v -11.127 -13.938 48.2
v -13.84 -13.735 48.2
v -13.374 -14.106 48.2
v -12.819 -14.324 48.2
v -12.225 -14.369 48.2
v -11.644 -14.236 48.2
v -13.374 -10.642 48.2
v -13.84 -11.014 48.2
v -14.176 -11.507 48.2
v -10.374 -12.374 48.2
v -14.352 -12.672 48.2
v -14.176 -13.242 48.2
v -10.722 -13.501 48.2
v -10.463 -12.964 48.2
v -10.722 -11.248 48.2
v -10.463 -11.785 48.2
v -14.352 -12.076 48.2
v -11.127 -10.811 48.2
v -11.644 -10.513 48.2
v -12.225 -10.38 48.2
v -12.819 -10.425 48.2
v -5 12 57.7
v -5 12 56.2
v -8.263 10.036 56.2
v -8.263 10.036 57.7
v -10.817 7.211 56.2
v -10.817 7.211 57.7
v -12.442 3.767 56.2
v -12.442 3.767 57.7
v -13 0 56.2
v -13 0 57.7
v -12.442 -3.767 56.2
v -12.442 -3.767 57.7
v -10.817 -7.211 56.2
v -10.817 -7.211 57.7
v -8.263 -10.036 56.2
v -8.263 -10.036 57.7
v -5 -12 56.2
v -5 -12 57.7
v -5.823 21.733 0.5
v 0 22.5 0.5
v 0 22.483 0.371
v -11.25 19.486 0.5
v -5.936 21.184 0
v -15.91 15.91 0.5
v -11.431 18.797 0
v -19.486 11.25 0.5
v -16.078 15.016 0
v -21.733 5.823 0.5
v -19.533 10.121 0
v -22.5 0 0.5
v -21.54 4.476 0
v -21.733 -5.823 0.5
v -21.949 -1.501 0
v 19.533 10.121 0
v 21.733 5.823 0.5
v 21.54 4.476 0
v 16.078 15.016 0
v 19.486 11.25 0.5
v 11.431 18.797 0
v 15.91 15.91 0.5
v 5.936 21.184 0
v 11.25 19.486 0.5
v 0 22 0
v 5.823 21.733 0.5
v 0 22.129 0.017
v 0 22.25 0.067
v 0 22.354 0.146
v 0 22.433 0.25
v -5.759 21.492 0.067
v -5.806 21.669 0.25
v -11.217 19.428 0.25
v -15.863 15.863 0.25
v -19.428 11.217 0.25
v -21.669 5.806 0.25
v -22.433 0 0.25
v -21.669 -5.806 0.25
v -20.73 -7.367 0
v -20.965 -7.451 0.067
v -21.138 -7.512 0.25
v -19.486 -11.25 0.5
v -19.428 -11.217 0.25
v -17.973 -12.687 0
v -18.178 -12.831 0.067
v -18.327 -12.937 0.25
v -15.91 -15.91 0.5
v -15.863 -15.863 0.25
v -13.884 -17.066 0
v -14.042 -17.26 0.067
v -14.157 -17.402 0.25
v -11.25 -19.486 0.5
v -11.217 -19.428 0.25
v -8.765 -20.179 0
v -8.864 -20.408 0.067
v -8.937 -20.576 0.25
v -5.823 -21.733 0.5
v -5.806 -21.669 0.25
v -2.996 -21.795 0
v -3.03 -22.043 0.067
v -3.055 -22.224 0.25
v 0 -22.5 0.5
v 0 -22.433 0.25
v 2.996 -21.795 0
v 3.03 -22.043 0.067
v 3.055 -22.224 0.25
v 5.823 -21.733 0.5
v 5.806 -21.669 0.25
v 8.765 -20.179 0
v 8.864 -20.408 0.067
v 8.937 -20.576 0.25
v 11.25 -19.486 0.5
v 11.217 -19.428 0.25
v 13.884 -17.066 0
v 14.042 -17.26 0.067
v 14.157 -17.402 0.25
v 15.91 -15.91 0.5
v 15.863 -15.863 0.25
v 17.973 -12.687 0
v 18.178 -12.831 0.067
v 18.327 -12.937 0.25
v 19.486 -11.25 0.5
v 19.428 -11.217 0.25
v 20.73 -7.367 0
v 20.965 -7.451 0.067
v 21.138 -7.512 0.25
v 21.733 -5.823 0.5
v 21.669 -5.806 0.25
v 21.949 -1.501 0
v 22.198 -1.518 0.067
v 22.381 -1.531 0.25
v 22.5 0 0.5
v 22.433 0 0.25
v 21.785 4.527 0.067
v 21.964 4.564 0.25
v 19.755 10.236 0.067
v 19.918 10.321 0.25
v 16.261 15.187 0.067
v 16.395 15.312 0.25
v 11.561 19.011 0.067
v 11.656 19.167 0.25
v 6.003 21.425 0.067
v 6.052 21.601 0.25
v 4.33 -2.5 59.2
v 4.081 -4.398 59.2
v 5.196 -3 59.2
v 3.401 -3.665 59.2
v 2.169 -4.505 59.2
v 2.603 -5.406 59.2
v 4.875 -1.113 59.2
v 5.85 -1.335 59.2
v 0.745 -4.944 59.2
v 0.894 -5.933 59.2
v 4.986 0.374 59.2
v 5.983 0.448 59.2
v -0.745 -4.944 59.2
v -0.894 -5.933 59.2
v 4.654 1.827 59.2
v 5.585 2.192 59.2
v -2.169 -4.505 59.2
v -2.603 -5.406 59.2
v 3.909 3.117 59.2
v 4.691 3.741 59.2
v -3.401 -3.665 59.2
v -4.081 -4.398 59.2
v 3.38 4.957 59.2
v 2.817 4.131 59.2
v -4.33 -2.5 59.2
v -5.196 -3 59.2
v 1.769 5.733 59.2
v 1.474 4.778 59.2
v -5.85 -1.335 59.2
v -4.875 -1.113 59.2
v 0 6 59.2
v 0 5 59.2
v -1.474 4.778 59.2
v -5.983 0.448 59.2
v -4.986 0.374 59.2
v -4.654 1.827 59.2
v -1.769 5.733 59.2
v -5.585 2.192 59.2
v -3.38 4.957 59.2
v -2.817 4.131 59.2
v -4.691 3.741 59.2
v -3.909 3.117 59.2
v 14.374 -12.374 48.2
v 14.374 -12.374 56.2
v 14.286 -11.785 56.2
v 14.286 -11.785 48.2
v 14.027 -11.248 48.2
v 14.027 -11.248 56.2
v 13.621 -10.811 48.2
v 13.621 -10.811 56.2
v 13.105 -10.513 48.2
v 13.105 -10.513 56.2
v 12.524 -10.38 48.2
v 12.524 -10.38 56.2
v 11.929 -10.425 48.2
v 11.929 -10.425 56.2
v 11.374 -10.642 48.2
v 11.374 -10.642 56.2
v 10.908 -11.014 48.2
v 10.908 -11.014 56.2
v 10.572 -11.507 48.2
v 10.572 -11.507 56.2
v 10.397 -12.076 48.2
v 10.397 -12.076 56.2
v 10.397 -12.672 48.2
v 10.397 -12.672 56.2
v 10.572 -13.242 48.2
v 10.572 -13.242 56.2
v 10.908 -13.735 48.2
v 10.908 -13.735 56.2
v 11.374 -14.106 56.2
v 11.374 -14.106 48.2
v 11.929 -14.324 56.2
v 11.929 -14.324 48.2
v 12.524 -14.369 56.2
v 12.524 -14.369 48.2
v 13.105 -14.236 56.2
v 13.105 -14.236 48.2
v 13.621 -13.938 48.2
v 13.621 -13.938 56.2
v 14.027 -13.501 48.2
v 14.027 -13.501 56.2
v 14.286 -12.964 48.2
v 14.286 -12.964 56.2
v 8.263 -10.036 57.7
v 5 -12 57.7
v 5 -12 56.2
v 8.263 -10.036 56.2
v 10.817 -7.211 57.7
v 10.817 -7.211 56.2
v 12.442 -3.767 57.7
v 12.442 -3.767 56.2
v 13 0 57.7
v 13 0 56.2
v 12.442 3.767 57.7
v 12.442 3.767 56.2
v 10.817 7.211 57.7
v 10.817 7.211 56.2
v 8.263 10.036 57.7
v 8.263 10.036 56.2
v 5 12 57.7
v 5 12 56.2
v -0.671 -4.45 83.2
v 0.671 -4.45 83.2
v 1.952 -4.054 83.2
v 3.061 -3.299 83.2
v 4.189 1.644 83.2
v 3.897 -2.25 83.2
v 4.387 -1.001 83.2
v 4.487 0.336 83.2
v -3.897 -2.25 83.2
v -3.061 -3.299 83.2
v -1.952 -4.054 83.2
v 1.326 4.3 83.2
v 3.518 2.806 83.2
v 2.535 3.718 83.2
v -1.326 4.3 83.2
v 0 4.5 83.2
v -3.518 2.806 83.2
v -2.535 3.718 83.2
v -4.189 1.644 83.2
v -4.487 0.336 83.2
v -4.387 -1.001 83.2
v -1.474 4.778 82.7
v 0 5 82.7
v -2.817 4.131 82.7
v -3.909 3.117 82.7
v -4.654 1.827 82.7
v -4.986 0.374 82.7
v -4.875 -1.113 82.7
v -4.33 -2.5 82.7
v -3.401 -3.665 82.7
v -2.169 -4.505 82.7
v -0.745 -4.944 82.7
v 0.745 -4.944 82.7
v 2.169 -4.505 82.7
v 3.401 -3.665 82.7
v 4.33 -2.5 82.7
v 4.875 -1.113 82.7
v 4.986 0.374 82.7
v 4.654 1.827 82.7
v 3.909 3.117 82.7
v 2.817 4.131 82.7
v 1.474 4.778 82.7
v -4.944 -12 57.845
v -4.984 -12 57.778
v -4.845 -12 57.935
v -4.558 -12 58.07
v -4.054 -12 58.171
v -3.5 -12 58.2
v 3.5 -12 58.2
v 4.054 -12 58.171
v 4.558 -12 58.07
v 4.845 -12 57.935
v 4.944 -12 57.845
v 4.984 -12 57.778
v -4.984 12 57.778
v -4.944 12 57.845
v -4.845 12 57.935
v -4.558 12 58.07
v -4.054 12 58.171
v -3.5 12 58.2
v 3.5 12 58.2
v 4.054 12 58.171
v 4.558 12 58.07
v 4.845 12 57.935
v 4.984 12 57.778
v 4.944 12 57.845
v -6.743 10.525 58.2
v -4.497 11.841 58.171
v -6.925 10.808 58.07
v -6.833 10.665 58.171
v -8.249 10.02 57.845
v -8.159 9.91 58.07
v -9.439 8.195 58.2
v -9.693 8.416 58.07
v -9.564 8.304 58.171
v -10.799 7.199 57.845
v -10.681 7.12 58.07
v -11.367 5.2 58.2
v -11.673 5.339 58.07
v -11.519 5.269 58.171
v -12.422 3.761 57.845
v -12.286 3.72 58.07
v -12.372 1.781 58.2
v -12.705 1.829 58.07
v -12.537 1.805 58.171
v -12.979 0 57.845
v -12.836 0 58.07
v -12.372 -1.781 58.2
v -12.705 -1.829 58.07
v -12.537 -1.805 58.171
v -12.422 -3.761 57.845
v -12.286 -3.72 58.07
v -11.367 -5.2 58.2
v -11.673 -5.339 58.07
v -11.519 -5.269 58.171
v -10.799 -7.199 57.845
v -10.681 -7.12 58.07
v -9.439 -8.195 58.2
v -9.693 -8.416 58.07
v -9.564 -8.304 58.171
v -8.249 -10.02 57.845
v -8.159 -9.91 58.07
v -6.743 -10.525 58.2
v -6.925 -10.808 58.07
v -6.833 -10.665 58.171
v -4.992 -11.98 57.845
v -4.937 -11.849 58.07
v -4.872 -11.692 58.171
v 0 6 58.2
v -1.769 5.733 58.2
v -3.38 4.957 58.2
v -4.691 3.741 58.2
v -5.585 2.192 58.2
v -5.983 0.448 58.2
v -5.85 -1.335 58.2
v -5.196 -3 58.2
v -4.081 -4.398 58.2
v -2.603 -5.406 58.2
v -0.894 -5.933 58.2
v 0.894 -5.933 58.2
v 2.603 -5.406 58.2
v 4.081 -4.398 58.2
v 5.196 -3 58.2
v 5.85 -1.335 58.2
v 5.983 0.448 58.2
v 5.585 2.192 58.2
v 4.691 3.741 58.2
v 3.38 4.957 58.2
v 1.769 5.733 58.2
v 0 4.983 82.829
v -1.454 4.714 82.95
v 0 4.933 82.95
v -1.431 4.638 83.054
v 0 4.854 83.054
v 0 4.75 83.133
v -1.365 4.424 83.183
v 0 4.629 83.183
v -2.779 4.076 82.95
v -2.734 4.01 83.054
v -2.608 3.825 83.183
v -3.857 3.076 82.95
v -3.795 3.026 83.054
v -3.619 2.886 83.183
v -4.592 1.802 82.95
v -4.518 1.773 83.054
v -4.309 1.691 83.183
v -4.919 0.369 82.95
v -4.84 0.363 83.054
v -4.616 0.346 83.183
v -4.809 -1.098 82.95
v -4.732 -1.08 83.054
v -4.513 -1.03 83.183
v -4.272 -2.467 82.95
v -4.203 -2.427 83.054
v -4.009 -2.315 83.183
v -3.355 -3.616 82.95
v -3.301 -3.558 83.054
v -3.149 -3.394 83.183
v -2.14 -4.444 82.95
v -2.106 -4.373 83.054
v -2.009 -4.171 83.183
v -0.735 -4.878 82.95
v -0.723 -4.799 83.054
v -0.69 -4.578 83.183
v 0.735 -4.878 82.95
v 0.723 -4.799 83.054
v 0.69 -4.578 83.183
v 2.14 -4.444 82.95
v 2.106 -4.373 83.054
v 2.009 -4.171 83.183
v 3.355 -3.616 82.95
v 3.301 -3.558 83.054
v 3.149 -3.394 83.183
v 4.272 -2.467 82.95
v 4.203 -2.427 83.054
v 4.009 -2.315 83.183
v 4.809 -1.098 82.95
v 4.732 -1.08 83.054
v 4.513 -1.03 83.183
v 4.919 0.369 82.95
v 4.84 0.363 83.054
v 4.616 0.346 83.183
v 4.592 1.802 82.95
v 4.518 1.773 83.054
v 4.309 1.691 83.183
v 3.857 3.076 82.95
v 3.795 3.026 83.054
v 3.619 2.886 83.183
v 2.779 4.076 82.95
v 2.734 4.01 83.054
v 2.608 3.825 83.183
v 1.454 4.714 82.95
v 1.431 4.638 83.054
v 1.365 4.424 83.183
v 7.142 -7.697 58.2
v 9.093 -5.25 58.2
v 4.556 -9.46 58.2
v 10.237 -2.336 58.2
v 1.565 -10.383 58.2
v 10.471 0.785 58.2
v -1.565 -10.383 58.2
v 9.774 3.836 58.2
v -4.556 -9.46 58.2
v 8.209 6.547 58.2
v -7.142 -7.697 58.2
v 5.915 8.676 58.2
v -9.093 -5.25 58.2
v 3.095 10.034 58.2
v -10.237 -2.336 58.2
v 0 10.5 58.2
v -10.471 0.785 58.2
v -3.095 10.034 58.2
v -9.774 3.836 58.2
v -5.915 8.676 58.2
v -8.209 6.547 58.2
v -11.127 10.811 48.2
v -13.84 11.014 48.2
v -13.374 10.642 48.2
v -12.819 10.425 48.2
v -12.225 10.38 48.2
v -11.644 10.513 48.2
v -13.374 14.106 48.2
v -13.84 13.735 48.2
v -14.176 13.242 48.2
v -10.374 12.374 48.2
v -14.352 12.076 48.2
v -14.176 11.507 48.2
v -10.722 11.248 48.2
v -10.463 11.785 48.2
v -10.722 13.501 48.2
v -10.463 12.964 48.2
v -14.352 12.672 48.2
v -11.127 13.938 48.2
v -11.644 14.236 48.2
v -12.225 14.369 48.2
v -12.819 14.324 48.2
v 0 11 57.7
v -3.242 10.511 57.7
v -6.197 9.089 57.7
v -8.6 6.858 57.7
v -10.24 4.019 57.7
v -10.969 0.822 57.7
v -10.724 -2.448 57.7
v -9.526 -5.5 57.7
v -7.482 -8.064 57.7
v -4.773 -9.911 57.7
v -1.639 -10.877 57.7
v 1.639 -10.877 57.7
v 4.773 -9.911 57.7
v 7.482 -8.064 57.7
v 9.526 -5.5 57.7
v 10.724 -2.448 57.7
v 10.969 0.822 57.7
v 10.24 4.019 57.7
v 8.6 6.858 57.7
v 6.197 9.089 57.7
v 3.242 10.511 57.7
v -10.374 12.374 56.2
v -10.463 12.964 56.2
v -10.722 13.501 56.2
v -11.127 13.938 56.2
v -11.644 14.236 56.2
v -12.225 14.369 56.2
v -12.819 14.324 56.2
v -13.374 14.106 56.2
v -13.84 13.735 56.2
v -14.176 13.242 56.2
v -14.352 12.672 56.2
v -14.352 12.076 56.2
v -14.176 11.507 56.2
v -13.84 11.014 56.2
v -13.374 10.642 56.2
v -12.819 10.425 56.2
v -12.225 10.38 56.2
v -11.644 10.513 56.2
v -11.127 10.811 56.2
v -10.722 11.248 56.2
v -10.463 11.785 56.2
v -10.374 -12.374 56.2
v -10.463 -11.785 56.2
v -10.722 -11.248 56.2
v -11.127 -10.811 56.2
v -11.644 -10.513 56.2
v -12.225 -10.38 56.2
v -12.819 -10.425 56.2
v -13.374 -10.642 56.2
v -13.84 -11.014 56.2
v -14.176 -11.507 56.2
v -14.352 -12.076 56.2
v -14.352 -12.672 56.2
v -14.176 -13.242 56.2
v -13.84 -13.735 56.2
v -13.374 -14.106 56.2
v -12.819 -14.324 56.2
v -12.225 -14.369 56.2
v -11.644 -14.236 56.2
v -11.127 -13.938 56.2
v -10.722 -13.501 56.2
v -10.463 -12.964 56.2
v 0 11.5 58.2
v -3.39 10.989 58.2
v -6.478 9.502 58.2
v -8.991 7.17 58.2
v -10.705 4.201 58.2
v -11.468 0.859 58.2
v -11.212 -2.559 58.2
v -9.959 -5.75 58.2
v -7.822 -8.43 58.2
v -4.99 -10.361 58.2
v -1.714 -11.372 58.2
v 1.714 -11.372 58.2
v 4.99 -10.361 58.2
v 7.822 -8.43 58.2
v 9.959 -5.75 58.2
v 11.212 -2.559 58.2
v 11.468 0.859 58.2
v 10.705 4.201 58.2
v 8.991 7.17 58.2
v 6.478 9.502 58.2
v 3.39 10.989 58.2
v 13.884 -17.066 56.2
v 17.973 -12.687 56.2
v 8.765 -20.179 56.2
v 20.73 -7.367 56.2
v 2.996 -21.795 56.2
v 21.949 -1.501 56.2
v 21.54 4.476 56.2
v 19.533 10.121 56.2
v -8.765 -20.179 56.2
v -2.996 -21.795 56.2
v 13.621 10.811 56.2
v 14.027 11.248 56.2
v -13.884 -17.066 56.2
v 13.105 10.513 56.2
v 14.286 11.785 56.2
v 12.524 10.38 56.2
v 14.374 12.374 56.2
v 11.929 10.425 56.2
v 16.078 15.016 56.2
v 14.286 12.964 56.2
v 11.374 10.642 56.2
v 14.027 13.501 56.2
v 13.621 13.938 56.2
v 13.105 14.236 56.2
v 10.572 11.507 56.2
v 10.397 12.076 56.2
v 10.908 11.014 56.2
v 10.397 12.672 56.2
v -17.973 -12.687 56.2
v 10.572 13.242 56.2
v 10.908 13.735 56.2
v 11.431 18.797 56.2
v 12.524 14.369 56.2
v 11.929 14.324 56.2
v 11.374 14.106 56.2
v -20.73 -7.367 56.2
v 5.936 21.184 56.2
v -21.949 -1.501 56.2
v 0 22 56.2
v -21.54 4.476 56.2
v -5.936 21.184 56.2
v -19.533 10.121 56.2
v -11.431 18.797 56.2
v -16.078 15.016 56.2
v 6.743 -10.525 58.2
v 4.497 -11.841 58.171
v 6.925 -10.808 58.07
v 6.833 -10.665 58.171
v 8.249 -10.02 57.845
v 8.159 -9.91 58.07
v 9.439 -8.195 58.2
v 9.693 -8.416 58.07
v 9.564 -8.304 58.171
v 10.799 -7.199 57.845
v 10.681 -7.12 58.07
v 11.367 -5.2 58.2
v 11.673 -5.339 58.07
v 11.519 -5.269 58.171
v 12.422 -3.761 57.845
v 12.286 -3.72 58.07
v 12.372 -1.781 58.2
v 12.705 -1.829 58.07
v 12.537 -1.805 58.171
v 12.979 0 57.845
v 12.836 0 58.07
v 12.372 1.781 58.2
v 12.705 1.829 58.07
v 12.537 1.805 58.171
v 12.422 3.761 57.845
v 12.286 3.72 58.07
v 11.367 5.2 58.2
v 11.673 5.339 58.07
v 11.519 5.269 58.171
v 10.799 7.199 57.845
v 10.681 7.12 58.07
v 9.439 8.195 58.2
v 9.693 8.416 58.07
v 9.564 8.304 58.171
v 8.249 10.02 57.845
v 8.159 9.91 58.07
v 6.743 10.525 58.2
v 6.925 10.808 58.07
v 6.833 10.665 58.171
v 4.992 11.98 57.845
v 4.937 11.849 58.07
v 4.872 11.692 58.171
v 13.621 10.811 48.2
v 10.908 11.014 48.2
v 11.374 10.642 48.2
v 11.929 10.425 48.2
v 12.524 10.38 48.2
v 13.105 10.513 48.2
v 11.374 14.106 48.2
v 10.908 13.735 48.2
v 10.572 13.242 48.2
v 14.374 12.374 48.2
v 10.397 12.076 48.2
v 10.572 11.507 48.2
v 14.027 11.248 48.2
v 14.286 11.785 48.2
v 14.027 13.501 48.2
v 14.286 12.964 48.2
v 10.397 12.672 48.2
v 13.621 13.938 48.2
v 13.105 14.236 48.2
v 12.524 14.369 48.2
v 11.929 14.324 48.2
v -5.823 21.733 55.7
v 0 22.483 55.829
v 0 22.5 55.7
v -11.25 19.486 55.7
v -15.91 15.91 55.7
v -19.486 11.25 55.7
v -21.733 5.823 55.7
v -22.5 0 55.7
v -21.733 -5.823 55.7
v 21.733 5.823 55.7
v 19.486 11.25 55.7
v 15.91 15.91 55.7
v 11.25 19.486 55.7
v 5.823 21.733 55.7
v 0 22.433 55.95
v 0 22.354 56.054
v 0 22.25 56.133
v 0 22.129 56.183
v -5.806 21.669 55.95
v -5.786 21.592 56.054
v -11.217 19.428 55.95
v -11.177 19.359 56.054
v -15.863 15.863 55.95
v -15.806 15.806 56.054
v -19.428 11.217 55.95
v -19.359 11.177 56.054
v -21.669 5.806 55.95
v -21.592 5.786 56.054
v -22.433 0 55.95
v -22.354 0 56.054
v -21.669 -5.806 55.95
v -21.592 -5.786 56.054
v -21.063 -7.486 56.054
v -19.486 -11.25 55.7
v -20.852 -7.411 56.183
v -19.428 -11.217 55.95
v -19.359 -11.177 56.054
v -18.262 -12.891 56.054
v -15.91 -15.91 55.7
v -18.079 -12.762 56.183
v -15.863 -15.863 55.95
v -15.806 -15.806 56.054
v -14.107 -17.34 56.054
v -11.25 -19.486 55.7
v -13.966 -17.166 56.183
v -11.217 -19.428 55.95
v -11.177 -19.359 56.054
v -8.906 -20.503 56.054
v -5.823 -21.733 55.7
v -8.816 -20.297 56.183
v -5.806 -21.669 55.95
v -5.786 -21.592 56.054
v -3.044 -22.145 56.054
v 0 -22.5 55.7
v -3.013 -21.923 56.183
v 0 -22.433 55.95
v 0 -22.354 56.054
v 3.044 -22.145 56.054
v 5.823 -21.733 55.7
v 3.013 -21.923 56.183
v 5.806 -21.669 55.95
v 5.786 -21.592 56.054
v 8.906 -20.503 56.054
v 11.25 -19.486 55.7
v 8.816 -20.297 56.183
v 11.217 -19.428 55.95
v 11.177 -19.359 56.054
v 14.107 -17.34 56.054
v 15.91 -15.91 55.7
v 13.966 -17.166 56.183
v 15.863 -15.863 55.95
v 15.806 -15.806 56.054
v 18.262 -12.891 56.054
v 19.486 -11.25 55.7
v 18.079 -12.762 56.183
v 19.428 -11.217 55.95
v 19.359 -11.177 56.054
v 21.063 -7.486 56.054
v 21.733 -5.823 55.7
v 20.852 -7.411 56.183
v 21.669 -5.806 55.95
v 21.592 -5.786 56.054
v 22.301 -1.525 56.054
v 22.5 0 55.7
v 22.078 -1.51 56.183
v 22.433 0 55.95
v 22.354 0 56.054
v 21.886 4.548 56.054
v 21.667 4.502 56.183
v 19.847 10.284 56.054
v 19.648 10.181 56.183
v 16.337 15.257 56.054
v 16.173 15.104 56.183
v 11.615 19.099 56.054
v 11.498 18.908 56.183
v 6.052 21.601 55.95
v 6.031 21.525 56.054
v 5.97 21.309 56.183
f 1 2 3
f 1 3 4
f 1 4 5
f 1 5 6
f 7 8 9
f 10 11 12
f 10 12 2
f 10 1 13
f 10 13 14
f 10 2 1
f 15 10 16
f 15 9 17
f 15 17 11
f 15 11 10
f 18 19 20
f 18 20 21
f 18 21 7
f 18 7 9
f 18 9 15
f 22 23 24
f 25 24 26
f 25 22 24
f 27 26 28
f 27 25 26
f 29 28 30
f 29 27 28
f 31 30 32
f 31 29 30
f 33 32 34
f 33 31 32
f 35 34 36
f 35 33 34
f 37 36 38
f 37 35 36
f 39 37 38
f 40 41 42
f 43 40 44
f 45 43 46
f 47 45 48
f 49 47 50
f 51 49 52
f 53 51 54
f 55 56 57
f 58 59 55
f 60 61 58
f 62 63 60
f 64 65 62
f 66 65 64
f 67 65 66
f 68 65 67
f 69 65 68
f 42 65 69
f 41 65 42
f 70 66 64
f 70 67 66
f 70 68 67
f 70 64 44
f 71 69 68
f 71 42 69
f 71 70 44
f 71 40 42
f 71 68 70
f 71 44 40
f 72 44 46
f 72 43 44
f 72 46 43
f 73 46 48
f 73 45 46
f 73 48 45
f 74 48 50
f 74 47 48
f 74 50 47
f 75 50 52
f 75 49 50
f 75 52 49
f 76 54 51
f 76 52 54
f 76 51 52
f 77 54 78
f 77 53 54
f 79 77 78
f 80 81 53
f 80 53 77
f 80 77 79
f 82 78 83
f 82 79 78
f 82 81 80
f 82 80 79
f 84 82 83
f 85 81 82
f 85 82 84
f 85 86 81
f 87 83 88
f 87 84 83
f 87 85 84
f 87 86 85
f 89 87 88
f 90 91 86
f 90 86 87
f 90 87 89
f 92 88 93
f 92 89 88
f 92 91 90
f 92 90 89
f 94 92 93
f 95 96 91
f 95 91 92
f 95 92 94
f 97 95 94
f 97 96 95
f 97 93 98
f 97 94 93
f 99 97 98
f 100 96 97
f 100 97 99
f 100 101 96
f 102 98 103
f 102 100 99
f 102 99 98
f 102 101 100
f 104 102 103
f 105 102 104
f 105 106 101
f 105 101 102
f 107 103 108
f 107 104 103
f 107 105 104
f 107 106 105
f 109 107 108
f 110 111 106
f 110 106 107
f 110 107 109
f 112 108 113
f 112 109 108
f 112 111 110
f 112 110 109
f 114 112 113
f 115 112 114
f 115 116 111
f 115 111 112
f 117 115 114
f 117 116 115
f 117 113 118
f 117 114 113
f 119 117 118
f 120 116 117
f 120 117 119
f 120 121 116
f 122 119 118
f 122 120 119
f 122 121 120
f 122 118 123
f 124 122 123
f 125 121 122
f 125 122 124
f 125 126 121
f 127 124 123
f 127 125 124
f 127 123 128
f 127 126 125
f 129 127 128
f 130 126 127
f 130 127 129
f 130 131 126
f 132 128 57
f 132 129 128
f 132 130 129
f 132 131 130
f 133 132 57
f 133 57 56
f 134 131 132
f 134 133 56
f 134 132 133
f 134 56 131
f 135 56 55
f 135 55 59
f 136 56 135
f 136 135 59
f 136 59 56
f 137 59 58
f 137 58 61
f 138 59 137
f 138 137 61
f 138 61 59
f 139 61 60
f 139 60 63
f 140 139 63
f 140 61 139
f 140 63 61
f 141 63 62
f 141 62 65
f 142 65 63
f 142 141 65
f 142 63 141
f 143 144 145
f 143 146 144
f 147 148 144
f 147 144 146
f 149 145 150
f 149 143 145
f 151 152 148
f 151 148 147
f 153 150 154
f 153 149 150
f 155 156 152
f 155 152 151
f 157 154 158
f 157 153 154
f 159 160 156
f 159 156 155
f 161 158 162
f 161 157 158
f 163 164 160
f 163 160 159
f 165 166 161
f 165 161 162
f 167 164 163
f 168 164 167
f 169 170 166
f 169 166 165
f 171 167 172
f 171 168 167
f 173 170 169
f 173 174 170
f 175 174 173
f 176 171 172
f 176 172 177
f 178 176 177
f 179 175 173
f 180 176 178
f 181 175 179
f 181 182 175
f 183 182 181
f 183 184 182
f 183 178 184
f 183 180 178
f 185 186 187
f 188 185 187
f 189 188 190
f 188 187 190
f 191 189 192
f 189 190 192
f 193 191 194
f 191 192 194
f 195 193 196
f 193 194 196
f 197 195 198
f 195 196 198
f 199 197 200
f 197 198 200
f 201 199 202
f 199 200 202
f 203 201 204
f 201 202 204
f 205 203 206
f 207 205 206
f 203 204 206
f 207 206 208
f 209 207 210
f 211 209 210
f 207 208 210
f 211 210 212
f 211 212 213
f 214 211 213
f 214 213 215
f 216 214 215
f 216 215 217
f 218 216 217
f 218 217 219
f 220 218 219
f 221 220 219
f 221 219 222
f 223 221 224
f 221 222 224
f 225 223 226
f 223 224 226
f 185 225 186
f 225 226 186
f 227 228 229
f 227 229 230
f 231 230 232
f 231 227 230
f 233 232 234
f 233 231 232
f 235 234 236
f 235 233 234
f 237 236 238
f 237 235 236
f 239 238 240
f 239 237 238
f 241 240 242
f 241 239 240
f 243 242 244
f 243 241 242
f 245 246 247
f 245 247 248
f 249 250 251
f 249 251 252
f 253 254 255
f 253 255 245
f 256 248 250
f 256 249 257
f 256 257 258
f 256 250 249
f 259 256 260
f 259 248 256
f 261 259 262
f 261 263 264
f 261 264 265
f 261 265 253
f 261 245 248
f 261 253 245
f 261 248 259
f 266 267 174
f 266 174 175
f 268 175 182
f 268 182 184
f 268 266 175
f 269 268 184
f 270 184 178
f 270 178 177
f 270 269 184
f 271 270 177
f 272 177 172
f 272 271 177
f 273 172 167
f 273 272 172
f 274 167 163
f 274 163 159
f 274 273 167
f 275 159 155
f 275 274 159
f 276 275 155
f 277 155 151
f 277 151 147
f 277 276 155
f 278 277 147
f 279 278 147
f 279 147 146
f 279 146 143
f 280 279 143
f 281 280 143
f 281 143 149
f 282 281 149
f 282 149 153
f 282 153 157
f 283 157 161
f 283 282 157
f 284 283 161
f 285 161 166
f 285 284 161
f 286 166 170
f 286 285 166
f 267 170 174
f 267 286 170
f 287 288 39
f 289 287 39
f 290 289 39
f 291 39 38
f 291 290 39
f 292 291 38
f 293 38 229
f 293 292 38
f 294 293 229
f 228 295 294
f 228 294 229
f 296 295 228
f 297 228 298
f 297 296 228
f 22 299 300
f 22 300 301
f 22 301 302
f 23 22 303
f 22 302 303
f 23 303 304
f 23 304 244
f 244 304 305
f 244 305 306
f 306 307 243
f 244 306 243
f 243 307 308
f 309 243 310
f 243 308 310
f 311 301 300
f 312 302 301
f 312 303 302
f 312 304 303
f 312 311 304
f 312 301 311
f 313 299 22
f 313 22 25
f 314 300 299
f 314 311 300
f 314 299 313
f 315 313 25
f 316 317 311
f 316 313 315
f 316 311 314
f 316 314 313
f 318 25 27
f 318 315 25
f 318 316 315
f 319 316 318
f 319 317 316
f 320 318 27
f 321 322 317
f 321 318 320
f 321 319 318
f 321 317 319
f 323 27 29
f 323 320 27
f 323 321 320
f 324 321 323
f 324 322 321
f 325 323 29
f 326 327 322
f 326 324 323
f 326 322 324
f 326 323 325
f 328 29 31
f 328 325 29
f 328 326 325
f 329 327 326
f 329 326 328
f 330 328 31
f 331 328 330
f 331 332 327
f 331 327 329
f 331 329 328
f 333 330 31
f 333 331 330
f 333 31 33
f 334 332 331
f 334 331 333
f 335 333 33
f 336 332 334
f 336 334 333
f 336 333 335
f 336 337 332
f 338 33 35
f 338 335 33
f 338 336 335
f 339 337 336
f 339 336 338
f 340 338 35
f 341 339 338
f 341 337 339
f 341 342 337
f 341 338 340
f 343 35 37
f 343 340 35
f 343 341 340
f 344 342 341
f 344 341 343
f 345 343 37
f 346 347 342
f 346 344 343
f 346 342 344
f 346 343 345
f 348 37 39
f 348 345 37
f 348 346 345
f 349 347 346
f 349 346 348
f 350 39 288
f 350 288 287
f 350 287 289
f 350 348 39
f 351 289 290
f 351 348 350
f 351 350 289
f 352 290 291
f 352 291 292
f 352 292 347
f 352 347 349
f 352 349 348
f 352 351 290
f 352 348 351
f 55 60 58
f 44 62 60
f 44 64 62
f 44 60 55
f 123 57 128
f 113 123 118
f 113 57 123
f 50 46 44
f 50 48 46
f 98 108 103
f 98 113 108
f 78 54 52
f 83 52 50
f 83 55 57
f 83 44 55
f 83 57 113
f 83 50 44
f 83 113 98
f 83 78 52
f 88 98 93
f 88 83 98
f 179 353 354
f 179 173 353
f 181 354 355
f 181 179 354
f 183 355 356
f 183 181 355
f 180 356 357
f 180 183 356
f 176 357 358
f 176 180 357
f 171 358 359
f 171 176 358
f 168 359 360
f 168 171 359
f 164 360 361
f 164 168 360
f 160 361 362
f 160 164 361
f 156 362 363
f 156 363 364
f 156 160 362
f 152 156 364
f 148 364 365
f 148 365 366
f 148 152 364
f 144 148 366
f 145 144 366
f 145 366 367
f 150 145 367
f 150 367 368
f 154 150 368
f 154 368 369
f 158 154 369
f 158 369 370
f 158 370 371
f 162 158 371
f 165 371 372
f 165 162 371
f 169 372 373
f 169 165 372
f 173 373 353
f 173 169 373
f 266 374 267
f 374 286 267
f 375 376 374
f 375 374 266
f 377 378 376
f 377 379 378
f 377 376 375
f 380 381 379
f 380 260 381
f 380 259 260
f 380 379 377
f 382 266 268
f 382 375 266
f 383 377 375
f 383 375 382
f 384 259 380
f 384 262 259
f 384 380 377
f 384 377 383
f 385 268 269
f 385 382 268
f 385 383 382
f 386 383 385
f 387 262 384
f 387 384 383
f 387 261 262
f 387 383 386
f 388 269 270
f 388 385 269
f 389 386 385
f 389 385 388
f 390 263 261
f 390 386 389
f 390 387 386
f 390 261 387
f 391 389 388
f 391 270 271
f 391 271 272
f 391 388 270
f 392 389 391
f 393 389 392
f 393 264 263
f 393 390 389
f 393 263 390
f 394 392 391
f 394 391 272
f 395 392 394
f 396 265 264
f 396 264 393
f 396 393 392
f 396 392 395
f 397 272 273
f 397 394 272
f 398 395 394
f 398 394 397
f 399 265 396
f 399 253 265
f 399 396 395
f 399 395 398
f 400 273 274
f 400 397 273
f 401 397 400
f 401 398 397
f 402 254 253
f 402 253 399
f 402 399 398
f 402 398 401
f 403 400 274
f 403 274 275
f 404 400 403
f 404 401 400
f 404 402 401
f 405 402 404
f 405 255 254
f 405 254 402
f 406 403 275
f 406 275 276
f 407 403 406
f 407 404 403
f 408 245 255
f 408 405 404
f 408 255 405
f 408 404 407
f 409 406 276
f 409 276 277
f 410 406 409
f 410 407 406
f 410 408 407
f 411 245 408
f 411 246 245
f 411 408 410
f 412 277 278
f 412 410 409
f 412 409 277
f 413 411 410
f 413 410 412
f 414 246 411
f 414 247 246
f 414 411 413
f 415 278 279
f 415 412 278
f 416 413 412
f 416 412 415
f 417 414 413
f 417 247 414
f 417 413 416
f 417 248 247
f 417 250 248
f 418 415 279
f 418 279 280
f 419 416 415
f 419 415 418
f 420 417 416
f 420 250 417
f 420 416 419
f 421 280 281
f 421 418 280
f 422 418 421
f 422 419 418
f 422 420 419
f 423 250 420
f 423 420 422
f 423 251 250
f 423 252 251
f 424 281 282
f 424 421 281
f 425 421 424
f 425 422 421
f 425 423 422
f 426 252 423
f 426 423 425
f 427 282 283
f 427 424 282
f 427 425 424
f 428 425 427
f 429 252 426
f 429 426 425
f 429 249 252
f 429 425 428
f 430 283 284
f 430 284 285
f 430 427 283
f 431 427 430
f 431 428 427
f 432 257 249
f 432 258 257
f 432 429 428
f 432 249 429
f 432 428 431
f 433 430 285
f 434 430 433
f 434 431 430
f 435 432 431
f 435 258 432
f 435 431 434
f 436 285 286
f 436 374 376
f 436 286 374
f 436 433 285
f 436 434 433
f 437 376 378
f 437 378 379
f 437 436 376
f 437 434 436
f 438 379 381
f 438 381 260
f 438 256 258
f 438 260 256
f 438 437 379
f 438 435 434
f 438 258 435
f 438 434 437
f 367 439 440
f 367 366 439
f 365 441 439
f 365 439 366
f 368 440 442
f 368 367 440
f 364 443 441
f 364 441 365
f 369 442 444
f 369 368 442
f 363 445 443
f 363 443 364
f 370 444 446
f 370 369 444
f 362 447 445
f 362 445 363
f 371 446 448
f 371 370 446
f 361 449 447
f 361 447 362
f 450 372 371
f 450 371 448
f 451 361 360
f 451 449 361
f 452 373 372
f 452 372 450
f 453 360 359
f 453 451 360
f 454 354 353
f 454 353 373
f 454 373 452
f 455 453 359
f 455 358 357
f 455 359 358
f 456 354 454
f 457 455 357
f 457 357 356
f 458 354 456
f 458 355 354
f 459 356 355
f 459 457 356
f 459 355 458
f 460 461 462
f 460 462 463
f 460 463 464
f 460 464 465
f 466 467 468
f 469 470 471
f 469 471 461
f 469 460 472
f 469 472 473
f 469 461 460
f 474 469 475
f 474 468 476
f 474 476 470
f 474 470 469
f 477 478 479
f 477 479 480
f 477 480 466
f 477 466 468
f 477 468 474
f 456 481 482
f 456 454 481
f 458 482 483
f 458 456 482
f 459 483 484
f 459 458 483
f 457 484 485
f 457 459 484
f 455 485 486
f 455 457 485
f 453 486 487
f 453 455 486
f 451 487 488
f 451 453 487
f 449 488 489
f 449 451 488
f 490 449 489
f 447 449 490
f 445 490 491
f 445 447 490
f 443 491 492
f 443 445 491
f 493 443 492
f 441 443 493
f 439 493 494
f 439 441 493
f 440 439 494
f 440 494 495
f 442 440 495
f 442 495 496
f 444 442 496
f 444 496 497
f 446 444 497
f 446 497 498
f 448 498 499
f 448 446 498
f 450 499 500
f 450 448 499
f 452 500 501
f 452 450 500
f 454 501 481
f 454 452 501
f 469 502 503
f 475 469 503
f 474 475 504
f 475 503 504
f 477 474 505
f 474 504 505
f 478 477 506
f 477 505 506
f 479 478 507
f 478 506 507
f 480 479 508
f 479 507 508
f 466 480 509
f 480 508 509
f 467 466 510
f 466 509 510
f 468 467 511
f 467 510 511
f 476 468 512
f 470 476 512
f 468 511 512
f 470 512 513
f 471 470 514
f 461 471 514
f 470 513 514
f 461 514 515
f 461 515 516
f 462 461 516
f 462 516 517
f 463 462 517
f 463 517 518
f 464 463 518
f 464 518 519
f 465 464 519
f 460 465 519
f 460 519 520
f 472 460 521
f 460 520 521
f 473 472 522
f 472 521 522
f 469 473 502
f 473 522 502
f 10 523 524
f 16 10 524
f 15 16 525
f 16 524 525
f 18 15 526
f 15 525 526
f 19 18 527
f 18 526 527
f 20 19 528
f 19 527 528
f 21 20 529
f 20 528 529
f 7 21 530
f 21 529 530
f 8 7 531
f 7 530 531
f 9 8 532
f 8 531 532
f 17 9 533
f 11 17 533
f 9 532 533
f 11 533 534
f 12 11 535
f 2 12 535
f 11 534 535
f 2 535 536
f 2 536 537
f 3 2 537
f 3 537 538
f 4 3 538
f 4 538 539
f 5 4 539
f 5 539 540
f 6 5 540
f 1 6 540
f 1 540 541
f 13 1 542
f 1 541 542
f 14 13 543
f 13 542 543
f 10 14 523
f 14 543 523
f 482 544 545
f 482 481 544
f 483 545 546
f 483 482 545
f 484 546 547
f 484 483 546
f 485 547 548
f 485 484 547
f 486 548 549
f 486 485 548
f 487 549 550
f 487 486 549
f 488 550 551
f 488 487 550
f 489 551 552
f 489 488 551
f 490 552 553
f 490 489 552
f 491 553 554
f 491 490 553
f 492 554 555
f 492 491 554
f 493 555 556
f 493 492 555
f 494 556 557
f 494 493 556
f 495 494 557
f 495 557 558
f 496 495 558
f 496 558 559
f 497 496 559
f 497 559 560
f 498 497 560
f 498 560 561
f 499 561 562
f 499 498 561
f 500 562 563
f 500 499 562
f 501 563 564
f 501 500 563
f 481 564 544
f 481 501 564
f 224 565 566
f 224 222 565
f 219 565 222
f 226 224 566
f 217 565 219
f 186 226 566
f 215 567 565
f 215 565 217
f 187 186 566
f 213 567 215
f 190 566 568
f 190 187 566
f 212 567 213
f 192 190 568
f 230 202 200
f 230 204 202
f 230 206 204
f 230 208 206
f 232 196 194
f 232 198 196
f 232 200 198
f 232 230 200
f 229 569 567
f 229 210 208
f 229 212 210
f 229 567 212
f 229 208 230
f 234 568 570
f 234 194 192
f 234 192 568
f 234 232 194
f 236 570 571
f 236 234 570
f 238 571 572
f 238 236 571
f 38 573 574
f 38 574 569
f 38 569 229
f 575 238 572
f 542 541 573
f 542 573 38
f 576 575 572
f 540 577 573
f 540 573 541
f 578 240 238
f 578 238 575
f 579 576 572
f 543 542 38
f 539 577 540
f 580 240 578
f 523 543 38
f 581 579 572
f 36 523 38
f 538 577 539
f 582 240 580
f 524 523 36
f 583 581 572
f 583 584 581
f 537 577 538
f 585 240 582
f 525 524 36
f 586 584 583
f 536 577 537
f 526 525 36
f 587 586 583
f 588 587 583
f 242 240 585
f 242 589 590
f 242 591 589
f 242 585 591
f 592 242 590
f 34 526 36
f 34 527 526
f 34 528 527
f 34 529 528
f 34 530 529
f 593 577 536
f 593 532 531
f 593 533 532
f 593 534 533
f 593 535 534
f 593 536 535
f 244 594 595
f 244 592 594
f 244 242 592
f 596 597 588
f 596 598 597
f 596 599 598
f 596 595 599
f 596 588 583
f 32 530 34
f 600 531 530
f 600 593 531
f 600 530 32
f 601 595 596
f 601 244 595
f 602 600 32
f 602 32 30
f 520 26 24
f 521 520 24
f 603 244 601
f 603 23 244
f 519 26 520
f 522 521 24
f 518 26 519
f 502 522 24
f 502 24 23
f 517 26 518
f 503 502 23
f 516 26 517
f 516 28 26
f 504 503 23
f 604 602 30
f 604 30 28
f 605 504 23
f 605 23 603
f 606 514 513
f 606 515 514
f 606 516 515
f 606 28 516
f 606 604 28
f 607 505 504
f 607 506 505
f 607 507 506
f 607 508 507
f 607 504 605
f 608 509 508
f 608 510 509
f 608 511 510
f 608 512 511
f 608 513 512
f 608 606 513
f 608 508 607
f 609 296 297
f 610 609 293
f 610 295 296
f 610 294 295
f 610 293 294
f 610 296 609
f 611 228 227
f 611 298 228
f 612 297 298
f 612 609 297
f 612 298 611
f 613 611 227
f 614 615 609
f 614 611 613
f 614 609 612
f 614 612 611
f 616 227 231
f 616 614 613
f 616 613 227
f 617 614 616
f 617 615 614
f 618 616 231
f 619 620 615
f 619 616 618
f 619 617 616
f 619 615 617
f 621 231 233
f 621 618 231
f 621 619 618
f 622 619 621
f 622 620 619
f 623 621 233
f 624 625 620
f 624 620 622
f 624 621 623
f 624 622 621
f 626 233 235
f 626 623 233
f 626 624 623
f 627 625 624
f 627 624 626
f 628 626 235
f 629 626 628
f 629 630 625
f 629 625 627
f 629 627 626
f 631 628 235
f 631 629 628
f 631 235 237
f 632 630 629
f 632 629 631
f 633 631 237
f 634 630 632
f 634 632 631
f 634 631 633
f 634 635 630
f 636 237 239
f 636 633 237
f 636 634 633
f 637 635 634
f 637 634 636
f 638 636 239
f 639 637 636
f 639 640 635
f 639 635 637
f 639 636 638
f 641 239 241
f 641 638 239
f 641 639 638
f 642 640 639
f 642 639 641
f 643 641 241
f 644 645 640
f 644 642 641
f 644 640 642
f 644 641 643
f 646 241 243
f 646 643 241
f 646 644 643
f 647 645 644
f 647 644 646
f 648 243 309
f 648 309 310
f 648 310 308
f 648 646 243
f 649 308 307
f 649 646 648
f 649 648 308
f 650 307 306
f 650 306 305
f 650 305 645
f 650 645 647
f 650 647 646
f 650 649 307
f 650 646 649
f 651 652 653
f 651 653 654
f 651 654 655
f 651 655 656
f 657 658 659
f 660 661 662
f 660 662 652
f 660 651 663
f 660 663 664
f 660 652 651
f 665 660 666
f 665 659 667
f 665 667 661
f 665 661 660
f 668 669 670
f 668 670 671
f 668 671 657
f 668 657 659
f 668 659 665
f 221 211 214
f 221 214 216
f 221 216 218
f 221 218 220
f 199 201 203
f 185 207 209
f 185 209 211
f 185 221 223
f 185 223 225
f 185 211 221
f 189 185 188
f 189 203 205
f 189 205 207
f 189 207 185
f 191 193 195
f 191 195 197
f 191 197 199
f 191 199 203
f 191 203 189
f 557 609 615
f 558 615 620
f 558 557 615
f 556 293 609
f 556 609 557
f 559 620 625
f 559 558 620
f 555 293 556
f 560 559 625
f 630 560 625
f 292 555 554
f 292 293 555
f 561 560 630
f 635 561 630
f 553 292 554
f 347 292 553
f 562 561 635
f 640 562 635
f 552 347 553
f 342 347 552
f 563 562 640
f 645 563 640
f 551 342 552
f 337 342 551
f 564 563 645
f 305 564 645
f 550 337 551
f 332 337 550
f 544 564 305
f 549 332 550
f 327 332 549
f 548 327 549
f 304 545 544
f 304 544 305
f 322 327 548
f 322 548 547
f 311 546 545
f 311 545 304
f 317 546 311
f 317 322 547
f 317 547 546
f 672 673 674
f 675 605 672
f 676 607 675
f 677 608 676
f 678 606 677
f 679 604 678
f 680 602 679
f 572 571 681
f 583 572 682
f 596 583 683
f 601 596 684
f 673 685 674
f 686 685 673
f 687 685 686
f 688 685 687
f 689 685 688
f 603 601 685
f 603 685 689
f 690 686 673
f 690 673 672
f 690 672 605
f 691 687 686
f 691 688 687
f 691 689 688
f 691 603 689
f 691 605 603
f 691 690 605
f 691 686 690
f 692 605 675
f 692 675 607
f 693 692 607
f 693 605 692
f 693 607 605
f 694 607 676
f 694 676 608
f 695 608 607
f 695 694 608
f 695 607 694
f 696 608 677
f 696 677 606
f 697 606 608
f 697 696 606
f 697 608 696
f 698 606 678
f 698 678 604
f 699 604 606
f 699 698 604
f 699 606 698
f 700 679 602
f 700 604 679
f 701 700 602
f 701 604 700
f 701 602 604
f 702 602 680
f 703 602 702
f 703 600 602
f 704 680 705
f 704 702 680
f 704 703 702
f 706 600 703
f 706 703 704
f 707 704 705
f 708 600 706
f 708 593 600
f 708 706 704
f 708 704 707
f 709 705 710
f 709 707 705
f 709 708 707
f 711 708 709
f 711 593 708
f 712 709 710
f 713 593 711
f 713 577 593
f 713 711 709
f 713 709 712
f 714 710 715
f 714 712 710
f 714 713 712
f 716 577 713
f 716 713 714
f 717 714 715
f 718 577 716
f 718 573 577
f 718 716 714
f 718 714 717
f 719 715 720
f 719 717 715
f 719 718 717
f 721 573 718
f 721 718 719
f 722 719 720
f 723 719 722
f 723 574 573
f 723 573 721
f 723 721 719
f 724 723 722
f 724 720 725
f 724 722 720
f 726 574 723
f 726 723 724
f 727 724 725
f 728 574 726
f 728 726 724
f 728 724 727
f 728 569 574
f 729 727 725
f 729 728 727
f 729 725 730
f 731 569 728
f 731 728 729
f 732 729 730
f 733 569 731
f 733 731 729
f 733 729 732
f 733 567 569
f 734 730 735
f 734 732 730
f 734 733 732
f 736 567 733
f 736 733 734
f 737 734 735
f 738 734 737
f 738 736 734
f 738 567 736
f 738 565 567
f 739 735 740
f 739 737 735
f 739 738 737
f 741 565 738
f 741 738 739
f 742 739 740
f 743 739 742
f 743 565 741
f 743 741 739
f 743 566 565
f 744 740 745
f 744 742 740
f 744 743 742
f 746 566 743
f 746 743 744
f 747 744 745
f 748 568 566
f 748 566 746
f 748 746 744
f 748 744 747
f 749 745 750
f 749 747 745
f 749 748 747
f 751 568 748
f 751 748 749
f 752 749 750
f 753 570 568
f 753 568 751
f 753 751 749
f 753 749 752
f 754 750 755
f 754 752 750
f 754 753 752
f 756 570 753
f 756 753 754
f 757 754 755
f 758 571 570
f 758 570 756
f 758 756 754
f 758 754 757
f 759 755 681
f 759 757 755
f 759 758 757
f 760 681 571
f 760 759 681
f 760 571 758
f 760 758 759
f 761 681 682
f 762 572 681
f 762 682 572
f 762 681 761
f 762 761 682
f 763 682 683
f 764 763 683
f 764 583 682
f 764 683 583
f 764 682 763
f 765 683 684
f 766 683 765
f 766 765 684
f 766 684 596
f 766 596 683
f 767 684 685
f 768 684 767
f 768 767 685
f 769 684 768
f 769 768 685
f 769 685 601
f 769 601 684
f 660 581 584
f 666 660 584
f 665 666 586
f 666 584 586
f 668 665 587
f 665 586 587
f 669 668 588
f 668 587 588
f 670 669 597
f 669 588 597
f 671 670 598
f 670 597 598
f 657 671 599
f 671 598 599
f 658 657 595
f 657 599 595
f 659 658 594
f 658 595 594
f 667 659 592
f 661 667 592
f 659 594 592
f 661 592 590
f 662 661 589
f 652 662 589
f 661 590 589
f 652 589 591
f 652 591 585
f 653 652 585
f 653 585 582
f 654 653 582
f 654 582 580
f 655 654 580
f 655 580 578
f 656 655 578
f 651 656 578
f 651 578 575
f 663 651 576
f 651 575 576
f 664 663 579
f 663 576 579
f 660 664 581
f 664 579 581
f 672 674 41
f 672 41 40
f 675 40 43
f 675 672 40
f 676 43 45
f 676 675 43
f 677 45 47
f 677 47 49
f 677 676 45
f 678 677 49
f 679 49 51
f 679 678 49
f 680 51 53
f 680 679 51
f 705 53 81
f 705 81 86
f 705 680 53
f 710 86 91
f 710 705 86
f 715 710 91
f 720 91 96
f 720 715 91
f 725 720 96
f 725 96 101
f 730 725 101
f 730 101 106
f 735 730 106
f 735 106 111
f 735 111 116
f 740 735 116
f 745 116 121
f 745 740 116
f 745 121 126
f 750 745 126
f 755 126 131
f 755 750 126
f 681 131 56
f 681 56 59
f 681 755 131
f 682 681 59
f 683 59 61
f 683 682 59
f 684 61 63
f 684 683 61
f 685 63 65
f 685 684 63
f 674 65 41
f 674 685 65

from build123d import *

# Parameters (mm, degrees)
FILLET1_R          = 0.5
CUT_EXTRUDE1_DEPTH = 2
SKETCH4_R          = 2
CUT_EXTRUDE2_DEPTH = 8


with BuildPart() as part:
    # Sketch1 → Revolve1 (revolve)
    with BuildSketch(Plane(origin=(0, 0, 0), x_dir=(0, 0, -1), z_dir=(1, 0, 0))):
        Polygon((0, 0), (0, 22.5), (-56.2, 22.5), (-56.2, 13), (-58.2, 13), (-58.2, 11.5), (-57.7, 11), (-58.2, 10.5), (-58.2, 6), (-59.2, 6), (-59.2, 5), (-83.2, 5), (-83.2, 0), align=None)
    revolve(axis=Axis((0, 0, 0), (0, 0, 1)))

    # Fillet1
    fillet1_edges = [part.edges().sort_by_distance(p)[0] for p in [
        (0, -5, 83.2),
        (0, -13, 58.2),
        (0, -22.5, 56.2),
        (0, -22.5, 0),
    ]]
    fillet(fillet1_edges, radius=FILLET1_R)

    # Sketch3 → Cut-Extrude1 (cut)
    with BuildSketch(Plane.XY.offset(58.2)):
        with BuildLine():
            Line((-5, 12), (5, 12))
            ThreePointArc((5, 12), (0, 13), (-5, 12))
        make_face()
        with BuildLine():
            Line((-5, -12), (5, -12))
            ThreePointArc((5, -12), (0, -13), (-5, -12))
        make_face()
    extrude(amount=-CUT_EXTRUDE1_DEPTH, mode=Mode.SUBTRACT)

    # Sketch4 → Cut-Extrude2 (cut)
    with BuildSketch(Plane.XY.offset(56.2)):
        with Locations((-12.374368671, 12.374368671)):
            Circle(SKETCH4_R)
        with Locations((12.374368671, 12.374368671)):
            Circle(SKETCH4_R)
        with Locations((12.374368671, -12.374368671)):
            Circle(SKETCH4_R)
        with Locations((-12.374368671, -12.374368671)):
            Circle(SKETCH4_R)
    extrude(amount=-CUT_EXTRUDE2_DEPTH, mode=Mode.SUBTRACT)


solid = part.part
